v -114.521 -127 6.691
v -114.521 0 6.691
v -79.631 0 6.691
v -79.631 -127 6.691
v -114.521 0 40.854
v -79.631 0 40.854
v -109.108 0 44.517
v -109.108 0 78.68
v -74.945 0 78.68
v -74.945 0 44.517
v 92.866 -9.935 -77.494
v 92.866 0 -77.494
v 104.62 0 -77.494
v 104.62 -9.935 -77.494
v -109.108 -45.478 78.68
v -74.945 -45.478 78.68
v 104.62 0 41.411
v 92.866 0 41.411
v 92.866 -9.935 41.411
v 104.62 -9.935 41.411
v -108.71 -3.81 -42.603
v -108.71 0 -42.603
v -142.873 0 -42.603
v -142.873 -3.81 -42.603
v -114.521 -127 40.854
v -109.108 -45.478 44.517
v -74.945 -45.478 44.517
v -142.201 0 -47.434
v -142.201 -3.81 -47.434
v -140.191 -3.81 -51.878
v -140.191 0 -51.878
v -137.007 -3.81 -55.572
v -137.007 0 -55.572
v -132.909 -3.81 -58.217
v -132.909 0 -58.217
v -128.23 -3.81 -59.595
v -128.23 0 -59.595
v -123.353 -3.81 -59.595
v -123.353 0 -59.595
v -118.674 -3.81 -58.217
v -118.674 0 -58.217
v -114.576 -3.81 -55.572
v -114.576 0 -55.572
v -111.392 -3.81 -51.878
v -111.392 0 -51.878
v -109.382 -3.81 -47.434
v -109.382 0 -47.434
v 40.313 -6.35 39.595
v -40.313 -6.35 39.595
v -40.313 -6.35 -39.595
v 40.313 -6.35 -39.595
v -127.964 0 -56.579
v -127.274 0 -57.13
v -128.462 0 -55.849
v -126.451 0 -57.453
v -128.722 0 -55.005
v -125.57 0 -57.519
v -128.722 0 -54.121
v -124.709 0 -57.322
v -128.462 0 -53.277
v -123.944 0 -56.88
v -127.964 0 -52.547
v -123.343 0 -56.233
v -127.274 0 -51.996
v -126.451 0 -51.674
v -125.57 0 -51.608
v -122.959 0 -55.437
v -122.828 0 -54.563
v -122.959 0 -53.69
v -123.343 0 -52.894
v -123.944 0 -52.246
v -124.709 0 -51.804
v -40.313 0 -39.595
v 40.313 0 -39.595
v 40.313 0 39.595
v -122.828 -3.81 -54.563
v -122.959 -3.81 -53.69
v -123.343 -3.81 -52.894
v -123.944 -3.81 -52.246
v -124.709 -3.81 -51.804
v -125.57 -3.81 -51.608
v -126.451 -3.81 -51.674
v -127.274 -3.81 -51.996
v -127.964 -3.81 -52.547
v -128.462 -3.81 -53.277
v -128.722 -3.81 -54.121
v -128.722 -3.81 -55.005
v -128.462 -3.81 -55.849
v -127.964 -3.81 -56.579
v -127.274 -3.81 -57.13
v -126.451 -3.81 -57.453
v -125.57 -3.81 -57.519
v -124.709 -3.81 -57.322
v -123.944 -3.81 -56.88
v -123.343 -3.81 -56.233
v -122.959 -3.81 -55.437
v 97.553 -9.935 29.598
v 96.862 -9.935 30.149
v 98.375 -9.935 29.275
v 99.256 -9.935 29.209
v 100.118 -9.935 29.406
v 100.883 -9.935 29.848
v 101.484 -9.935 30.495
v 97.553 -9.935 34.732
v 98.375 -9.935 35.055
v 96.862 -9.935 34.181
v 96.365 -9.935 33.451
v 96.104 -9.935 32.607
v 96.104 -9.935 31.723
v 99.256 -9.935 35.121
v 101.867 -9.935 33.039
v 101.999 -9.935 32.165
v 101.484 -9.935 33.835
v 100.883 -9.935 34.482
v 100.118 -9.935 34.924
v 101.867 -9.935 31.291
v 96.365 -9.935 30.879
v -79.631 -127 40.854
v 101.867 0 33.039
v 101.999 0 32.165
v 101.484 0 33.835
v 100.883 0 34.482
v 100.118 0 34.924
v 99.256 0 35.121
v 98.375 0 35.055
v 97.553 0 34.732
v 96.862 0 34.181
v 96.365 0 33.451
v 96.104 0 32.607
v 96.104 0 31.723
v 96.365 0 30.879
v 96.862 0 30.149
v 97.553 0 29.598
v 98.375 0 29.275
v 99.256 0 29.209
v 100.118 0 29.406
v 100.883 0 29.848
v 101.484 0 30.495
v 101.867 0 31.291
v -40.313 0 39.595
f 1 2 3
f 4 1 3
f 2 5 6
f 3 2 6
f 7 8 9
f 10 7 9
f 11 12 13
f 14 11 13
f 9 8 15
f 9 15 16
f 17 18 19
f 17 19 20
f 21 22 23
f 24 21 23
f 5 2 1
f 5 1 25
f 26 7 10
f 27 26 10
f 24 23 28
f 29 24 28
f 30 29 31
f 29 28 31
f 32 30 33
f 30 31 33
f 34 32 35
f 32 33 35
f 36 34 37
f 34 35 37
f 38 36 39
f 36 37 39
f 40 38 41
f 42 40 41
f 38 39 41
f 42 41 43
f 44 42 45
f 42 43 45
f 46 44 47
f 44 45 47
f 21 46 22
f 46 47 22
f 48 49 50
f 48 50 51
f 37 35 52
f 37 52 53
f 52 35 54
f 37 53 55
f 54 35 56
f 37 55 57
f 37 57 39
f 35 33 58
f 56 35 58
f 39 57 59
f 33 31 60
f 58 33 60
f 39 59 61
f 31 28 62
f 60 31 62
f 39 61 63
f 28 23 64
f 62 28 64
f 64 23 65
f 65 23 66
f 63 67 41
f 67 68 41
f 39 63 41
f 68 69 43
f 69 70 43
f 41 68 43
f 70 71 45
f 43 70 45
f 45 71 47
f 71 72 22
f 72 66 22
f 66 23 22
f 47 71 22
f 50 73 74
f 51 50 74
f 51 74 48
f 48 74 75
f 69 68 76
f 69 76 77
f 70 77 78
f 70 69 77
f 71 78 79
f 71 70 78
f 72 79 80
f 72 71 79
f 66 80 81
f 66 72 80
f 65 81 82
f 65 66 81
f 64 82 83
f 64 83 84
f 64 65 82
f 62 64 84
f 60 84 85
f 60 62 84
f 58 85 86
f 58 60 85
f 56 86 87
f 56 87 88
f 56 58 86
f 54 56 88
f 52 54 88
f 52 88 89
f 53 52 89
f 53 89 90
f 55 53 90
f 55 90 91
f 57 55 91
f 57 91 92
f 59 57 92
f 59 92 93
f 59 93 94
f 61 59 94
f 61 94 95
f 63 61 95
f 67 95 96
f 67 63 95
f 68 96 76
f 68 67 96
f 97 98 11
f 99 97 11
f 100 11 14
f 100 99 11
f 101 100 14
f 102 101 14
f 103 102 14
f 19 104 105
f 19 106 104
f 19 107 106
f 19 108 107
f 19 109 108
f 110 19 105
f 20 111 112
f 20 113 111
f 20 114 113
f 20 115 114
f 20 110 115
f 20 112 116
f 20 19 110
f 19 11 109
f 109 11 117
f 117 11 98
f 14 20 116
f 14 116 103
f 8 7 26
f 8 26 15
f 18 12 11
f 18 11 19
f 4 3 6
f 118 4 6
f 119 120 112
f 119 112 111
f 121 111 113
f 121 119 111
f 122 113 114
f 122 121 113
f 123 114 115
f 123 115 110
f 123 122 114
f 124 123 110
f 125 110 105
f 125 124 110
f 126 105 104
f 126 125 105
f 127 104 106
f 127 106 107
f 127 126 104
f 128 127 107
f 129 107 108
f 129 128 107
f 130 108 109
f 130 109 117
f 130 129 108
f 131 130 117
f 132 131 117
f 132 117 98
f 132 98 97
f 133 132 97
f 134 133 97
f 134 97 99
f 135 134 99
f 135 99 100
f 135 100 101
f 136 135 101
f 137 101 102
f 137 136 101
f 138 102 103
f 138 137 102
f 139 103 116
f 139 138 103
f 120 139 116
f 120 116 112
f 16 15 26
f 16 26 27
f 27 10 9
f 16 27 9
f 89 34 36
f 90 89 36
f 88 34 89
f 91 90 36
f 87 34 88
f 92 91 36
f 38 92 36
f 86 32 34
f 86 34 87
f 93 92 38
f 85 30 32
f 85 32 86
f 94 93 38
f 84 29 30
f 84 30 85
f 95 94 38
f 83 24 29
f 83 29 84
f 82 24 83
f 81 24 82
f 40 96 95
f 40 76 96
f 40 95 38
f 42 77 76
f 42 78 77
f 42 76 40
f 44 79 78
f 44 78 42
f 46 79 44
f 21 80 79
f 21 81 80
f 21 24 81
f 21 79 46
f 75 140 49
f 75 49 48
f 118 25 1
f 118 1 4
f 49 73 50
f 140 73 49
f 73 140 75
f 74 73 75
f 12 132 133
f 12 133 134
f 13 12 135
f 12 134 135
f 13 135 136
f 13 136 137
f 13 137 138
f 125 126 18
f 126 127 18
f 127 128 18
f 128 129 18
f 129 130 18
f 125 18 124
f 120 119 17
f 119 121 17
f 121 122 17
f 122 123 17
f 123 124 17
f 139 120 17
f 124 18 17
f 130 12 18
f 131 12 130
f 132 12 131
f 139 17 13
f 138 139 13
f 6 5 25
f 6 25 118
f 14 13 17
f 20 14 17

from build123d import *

# Parameters (mm, degrees)
F0_W     = 80.625468
F0_H     = 79.189382
F1_DEPTH = 6.35
F2_W     = 34.889974
F2_H     = 34.163102
F3_DEPTH = 127
F4_R     = 2.963833
F5_DEPTH = 3.81
F6_W     = 34.163
F6_H     = 34.163
F7_DEPTH = 45.47785
F8_W     = 11.753656
F8_H     = 118.904555
F8_R     = 2.963837
F9_DEPTH = 9.93472


with BuildPart() as f1:
    # F0 (on Front) → F1 (new body)
    with BuildSketch(Plane.XZ):
        Rectangle(F0_W, F0_H)
    extrude(amount=F1_DEPTH)


with BuildPart() as f3:
    # F2 (on Front) → F3 (new body)
    with BuildSketch(Plane.XZ):
        with Locations((-97.075891, 23.772512)):
            Rectangle(F2_W, F2_H)
    extrude(amount=F3_DEPTH)


with BuildPart() as f5:
    # F4 (on Front) → F5 (new body)
    with BuildSketch(Plane.XZ):
        with BuildLine():
            Line((-108.710087, -42.602777), (-142.873087, -42.602777))
            ThreePointArc((-142.873087, -42.602777), (-125.791587, -59.769982), (-108.710087, -42.602777))
        make_face()
        with Locations((-125.791587, -54.56315)):
            Circle(F4_R, mode=Mode.SUBTRACT)
    extrude(amount=F5_DEPTH)


with BuildPart() as f7:
    # F6 (on Front) → F7 (new body)
    with BuildSketch(Plane.XZ):
        with Locations((-92.026204, 61.598923)):
            Rectangle(F6_W, F6_H)
    extrude(amount=F7_DEPTH)


with BuildPart() as f9:
    # F8 (on Front) → F9 (new body)
    with BuildSketch(Plane.XZ):
        with Locations((98.742809, -18.041707)):
            Rectangle(F8_W, F8_H)
        with Locations((99.034849, 32.165025)):
            Circle(F8_R, mode=Mode.SUBTRACT)
    extrude(amount=F9_DEPTH)


solid = Compound([f1.part, f3.part, f5.part, f7.part, f9.part])
